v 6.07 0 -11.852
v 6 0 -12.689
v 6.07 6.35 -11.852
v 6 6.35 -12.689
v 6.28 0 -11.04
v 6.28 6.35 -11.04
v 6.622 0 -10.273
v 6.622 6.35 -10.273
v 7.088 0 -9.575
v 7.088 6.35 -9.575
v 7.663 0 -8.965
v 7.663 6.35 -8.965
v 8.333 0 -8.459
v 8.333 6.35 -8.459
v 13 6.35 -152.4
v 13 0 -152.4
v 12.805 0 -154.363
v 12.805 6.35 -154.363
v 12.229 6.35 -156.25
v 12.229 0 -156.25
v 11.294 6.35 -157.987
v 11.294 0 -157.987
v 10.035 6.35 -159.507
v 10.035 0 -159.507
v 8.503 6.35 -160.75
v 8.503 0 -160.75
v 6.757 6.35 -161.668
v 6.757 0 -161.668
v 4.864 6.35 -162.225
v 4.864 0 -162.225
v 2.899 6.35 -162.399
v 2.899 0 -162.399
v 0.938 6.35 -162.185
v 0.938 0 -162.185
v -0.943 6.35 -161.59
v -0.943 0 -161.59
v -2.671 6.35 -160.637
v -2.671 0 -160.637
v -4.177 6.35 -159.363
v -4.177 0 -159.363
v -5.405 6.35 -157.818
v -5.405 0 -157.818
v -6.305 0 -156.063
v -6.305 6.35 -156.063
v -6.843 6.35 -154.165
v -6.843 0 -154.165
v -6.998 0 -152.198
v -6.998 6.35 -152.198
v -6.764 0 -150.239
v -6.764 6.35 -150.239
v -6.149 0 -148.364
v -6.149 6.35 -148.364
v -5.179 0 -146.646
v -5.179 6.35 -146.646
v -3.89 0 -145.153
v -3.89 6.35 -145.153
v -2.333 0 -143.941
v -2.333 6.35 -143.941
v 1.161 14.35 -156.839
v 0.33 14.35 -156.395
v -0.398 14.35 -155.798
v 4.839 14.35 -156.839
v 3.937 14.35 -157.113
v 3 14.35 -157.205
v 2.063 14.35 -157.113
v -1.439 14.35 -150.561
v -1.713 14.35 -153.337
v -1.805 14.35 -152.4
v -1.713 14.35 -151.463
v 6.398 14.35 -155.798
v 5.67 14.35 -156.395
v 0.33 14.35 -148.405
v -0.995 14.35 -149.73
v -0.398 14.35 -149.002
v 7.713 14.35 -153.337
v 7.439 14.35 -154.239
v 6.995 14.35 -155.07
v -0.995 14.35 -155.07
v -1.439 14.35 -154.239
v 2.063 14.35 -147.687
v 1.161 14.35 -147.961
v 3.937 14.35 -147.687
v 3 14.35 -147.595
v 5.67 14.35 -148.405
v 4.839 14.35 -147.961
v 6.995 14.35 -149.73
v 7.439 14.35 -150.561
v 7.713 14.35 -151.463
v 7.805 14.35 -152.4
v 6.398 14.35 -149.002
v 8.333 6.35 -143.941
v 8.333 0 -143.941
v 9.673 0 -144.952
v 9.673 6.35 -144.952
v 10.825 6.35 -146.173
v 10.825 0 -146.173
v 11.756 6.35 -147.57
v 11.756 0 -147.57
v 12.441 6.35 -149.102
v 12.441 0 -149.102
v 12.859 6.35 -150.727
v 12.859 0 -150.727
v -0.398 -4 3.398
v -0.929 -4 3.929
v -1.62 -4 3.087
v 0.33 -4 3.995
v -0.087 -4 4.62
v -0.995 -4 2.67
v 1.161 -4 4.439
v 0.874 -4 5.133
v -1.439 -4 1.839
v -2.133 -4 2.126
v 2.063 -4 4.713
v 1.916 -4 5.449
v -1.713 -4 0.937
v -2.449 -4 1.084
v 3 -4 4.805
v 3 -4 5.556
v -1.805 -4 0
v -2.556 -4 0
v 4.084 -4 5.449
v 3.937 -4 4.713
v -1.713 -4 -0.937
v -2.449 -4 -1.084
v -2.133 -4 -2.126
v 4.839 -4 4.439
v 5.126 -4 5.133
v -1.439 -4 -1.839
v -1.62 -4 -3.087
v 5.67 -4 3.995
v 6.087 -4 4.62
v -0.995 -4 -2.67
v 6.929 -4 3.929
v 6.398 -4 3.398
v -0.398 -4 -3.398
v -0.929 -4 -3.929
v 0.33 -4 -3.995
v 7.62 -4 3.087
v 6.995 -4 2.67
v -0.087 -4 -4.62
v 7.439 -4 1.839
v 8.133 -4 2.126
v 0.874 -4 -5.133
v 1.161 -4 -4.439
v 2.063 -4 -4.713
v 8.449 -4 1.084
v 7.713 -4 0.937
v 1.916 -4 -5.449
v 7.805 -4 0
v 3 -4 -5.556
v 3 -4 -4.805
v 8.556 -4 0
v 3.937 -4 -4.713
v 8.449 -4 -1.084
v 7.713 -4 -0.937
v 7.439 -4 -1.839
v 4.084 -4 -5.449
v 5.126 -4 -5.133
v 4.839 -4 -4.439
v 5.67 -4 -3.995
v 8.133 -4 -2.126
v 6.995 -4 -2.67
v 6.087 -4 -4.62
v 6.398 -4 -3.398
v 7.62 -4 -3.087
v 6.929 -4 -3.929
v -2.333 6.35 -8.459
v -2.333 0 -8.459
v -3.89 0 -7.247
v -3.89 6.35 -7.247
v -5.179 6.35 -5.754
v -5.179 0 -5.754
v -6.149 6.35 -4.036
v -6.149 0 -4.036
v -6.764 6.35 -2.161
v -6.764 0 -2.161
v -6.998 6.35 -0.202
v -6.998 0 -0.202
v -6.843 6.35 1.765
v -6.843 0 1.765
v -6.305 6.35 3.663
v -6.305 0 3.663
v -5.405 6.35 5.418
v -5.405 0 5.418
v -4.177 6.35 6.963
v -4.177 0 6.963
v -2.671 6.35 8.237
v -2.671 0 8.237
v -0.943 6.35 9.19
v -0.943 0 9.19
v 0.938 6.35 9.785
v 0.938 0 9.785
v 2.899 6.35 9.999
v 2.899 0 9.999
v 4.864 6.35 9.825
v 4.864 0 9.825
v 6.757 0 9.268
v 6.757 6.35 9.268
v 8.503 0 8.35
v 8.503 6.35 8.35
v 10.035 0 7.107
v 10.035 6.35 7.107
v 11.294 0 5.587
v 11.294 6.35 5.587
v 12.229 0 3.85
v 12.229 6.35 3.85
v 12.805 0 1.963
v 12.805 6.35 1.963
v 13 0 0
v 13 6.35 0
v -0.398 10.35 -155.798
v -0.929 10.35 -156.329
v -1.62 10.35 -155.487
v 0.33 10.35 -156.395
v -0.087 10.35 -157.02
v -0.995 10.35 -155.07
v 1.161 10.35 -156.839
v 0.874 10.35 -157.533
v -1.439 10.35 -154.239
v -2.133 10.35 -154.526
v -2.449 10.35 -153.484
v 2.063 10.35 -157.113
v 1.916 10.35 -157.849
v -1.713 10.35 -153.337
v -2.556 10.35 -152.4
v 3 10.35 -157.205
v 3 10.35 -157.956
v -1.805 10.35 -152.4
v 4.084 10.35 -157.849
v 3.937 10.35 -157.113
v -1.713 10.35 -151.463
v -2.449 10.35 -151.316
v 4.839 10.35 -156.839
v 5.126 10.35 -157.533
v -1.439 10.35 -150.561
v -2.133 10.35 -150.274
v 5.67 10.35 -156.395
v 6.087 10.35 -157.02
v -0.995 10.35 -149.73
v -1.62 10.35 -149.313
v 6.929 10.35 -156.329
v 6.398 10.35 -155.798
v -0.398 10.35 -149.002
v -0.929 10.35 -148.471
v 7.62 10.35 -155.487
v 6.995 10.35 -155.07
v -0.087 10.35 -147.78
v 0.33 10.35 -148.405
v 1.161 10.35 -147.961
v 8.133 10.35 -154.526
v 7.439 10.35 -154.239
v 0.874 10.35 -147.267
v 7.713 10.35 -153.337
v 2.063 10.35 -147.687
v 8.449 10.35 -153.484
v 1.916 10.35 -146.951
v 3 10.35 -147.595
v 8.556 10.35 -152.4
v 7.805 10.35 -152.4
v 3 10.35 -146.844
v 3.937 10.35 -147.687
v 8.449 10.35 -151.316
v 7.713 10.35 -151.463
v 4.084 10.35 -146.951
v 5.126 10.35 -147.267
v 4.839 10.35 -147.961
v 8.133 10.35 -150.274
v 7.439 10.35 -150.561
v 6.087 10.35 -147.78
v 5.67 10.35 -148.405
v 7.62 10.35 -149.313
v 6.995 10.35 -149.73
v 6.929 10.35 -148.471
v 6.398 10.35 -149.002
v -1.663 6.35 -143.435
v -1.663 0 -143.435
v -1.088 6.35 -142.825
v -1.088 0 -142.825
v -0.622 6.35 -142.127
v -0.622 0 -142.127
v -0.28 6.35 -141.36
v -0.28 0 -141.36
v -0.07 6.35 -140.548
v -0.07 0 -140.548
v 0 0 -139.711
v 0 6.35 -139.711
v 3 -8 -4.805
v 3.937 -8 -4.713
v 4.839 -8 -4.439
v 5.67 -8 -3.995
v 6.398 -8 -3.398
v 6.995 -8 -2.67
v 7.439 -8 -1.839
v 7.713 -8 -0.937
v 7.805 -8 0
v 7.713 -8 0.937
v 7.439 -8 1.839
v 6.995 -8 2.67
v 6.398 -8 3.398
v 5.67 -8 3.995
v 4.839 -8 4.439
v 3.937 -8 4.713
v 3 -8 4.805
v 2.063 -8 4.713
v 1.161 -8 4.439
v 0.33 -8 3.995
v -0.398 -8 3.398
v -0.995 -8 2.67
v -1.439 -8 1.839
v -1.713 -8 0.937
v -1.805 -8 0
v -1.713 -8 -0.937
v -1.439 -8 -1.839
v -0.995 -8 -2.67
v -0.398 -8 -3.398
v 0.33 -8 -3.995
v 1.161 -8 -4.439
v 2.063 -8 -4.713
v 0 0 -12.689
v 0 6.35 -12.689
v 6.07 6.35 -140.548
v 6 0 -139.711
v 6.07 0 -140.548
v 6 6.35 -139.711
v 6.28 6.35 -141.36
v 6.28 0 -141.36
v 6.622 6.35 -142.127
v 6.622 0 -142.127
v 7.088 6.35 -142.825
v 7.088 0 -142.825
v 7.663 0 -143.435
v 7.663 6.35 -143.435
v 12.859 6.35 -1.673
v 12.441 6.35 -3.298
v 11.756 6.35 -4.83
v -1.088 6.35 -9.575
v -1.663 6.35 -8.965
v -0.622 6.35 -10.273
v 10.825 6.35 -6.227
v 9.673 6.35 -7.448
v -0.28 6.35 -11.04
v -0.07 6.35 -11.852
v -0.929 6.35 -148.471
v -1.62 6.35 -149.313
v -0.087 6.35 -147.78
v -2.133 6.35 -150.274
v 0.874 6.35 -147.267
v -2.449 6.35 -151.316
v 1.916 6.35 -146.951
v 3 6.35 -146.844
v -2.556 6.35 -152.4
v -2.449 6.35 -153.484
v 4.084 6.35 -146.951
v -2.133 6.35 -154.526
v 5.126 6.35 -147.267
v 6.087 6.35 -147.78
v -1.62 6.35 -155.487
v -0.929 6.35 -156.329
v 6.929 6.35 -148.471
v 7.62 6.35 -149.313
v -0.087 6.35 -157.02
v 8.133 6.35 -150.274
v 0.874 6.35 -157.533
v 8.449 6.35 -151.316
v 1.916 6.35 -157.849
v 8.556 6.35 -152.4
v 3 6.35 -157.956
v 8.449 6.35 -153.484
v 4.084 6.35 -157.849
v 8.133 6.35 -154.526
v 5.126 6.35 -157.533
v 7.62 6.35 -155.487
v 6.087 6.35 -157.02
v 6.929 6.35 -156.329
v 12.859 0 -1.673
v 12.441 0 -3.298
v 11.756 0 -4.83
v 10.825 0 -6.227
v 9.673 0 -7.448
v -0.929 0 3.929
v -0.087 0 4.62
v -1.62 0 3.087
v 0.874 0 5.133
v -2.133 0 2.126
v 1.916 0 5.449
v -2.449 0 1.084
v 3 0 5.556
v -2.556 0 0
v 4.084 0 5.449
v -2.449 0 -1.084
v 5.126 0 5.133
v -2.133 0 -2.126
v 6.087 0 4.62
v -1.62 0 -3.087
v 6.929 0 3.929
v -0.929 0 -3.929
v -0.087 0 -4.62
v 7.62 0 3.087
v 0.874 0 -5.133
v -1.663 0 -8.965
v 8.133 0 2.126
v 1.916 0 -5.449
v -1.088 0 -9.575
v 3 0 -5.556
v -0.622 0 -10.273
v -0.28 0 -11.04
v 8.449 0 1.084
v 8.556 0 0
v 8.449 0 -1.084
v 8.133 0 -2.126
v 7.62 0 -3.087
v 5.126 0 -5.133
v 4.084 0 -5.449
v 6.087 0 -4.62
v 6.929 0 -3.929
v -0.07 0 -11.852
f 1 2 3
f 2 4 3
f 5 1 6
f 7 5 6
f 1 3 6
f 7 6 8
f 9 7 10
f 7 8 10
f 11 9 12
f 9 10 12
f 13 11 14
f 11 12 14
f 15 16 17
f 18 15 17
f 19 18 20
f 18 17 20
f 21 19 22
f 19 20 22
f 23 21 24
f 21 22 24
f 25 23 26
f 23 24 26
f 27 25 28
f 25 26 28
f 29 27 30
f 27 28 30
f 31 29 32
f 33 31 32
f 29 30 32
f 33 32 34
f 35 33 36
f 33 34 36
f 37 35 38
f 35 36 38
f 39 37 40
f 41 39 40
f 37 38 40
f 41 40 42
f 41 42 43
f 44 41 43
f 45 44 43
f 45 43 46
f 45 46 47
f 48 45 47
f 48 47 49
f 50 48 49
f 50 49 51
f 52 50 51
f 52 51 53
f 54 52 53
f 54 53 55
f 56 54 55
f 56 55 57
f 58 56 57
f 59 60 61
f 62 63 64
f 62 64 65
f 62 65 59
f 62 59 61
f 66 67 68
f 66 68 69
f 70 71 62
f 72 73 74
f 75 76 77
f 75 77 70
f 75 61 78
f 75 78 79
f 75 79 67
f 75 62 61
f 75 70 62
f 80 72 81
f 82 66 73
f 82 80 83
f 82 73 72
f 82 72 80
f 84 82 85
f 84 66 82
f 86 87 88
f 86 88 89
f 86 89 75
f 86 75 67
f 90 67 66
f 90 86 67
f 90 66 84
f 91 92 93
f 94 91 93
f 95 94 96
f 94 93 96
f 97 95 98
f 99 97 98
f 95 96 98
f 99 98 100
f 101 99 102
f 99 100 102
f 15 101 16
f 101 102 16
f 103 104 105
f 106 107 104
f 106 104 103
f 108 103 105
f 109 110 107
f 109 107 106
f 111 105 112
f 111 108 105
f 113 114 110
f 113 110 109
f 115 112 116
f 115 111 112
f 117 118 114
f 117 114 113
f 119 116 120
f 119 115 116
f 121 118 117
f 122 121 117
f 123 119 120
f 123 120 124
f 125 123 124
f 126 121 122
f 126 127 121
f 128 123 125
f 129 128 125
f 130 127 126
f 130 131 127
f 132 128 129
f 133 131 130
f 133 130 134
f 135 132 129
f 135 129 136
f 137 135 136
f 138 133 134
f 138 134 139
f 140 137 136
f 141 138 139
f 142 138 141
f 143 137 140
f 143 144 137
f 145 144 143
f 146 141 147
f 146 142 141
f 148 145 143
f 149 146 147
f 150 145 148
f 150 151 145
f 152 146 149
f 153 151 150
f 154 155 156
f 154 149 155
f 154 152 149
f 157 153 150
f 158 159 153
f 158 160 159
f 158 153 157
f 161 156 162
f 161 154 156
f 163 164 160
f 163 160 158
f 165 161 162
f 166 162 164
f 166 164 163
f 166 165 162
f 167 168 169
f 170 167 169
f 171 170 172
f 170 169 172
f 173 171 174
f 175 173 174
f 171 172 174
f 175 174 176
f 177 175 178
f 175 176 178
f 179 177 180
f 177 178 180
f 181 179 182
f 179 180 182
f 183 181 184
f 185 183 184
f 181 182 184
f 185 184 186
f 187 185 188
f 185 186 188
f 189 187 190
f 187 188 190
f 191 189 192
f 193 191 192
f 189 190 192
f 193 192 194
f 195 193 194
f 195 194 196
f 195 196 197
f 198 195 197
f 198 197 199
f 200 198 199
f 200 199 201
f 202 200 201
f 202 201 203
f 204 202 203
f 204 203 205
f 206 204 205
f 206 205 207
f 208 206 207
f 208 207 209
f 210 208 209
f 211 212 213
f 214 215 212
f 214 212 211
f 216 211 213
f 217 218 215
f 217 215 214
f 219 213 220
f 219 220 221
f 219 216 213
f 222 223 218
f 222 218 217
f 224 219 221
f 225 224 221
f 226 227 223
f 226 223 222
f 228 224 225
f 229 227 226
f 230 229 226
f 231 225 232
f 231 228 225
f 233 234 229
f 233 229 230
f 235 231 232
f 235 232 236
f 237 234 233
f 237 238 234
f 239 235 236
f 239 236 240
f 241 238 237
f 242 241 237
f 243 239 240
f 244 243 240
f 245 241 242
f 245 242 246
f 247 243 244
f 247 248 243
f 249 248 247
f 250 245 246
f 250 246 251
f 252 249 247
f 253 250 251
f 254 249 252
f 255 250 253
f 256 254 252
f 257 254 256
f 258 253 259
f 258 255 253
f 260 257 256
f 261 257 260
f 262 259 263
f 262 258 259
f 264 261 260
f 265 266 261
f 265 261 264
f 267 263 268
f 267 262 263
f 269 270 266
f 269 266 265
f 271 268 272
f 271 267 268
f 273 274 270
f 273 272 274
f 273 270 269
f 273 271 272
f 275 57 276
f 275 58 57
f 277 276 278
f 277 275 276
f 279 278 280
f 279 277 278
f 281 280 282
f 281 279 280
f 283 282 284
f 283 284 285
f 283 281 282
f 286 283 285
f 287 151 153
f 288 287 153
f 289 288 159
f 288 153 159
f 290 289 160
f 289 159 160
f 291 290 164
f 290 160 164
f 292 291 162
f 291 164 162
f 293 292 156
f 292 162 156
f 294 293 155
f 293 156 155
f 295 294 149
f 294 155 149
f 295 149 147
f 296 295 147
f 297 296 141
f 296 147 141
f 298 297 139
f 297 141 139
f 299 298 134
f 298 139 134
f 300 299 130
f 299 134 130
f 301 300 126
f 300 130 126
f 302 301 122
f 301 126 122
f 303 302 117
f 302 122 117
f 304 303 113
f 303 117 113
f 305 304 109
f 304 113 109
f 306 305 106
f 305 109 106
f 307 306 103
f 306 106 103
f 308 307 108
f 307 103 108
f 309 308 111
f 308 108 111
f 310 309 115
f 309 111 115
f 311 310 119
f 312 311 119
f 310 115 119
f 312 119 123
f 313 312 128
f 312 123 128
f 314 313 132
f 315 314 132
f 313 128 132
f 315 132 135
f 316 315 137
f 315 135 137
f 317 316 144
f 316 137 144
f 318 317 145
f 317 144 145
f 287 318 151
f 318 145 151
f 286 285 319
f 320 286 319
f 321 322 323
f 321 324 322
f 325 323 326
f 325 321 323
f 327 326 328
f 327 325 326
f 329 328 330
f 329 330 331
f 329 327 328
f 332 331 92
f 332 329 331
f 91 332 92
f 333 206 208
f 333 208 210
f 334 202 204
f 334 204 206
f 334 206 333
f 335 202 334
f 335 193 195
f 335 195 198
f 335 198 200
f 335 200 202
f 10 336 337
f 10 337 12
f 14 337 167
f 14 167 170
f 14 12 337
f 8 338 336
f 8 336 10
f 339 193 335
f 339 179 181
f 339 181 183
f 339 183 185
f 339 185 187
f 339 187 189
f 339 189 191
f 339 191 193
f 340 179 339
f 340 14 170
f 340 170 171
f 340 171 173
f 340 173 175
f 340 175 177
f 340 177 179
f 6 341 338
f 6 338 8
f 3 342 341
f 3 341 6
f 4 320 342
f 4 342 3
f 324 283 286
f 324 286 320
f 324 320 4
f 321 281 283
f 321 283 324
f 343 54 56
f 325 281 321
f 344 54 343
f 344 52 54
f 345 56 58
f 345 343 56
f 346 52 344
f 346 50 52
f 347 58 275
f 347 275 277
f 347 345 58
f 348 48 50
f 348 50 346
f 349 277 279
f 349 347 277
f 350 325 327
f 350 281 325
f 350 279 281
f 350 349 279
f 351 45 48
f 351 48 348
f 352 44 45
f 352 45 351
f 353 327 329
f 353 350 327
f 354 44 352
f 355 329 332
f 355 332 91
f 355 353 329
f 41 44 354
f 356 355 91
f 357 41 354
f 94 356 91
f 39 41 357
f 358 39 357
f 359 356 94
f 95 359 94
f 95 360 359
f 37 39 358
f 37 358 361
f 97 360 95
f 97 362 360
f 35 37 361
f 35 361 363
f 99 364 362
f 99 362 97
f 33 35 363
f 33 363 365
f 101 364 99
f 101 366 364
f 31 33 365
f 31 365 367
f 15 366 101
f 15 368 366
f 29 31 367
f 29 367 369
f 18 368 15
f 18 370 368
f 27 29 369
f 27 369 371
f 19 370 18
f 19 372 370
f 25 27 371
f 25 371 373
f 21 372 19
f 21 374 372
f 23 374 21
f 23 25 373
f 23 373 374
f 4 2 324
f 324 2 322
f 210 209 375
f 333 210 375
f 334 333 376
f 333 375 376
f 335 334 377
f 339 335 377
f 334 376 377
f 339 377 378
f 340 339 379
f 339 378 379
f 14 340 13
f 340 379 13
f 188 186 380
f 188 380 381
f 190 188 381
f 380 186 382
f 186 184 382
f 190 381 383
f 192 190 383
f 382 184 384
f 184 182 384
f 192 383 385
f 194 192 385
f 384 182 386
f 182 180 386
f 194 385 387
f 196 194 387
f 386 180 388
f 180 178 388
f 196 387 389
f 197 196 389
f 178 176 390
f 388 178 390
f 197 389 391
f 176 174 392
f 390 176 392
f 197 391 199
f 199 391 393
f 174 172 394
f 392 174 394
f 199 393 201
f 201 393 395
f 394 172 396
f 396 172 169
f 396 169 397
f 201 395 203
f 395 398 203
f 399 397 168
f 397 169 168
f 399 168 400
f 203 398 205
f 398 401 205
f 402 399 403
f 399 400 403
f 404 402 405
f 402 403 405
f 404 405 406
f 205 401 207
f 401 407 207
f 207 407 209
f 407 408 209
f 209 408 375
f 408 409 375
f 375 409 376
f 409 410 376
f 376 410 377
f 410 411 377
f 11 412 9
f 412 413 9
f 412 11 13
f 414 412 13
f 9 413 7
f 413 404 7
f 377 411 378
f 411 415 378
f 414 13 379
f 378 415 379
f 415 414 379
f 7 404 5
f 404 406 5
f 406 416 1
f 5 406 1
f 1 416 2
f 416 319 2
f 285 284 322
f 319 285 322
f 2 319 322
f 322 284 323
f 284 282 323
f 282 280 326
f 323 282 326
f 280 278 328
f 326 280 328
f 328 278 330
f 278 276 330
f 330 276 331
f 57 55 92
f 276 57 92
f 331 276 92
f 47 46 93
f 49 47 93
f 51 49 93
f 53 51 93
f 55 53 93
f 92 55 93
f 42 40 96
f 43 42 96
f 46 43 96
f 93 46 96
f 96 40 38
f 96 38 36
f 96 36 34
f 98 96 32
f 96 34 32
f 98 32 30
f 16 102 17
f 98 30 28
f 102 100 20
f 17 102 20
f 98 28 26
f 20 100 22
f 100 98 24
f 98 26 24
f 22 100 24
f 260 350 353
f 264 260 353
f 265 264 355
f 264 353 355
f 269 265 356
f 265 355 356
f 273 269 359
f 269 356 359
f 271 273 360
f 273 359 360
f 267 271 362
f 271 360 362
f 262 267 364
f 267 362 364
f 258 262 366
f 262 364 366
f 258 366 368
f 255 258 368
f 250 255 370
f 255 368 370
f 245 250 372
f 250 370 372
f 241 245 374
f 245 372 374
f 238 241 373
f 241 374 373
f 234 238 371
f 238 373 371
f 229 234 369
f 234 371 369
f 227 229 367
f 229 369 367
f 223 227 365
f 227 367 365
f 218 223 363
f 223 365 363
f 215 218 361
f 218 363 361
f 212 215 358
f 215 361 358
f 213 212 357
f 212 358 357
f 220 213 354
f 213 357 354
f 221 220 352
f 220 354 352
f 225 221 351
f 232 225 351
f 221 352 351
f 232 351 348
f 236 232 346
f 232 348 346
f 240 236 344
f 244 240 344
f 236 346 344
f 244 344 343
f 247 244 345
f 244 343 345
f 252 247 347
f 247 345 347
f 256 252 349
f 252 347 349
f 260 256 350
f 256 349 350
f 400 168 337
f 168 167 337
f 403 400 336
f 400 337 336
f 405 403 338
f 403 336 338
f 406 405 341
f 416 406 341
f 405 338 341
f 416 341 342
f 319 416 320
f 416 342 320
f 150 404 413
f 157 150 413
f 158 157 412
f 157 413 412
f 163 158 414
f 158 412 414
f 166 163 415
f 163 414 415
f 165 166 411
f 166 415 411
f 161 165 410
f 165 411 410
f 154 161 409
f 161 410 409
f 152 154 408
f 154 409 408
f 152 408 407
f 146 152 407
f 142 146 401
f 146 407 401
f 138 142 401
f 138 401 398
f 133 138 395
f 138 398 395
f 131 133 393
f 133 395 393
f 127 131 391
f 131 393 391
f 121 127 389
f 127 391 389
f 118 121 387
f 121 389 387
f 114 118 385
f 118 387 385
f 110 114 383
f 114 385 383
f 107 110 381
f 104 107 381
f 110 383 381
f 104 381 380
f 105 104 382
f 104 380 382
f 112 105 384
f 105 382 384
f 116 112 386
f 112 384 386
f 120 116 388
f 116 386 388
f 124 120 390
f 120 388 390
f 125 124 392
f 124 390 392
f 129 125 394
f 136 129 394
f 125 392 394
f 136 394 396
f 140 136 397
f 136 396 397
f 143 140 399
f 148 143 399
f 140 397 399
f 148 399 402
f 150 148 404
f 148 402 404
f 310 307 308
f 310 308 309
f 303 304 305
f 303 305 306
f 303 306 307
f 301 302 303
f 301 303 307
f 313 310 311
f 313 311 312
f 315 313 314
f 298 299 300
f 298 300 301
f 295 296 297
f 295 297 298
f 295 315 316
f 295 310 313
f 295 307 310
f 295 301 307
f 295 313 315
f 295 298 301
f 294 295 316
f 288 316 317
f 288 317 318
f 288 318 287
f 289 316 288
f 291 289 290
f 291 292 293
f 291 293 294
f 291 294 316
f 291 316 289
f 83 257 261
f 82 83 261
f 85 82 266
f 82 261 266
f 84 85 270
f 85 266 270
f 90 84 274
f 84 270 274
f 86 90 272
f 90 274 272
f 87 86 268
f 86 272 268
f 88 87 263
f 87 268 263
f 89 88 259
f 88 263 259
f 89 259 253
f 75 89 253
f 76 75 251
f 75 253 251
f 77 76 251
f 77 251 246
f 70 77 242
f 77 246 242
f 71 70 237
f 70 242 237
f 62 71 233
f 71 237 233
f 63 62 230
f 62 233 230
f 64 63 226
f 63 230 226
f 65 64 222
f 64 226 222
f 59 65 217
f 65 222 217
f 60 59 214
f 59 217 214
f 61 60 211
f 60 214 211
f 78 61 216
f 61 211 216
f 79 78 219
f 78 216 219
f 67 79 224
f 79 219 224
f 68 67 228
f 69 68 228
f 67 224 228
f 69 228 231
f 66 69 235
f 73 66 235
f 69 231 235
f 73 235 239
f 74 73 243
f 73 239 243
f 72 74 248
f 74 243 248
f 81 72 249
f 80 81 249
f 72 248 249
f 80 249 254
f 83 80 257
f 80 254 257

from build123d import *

# Parameters (mm, degrees)
BOSS_EXTRUDE1_DEPTH = 6.35
SKETCH2_R           = 5.55625
BOSS_EXTRUDE2_DEPTH = 4
SKETCH4_R           = 4.805
BOSS_EXTRUDE3_DEPTH = 4
SKETCH5_R           = 5.55625
BOSS_EXTRUDE4_DEPTH = 4
SKETCH6_R           = 4.805
BOSS_EXTRUDE5_DEPTH = 4
FILLET1_R           = 5


with BuildPart() as part:
    # Sketch1 → Boss-Extrude1 (new body)
    with BuildSketch(Plane(origin=(0, 0, 0), x_dir=(1, 0, 0), z_dir=(0, 1, 0))):
        with BuildLine():
            Line((0, 9.539392014), (0, 0))
            Line((0, 0), (6, 0))
            Line((6, 0), (6, 9.539392014))
            ThreePointArc((6, 9.539392014), (3, 10), (0, 9.539392014))
        make_face()
        with BuildLine():
            Line((6, 0), (0, 0))
            Line((0, 0), (0, 9.539392014))
            ThreePointArc((0, 9.539392014), (-2.916079783, -8.062257748), (13, 0))
            ThreePointArc((13, 0), (11.062257748, 5.916079783), (6, 9.539392014))
            Line((6, 9.539392014), (6, 0))
        make_face()
        with BuildLine():
            Line((0, 142.860607986), (0, 9.539392014))
            ThreePointArc((0, 9.539392014), (3, 10), (6, 9.539392014))
            Line((6, 9.539392014), (6, 142.860607986))
            ThreePointArc((6, 142.860607986), (3, 142.4), (0, 142.860607986))
        make_face()
        with BuildLine():
            ThreePointArc((13, 152.4), (-2.916079783, 160.462257748), (0, 142.860607986))
            Line((0, 142.860607986), (0, 152.4))
            Line((0, 152.4), (6, 152.4))
            Line((6, 152.4), (6, 142.860607986))
            ThreePointArc((6, 142.860607986), (11.062257748, 146.483920217), (13, 152.4))
        make_face()
        with BuildLine():
            Line((0, 152.4), (0, 142.860607986))
            ThreePointArc((0, 142.860607986), (3, 142.4), (6, 142.860607986))
            Line((6, 142.860607986), (6, 152.4))
            Line((6, 152.4), (0, 152.4))
        make_face()
    extrude(amount=BOSS_EXTRUDE1_DEPTH)

    # Sketch2 → Boss-Extrude2 (add)
    with BuildSketch(Plane(origin=(0, 6.35, 0), x_dir=(1, 0, 0), z_dir=(0, 1, 0))):
        with Locations(Location((3, 152.4, 0), (0, 0, 270))):
            Circle(SKETCH2_R)
    extrude(amount=BOSS_EXTRUDE2_DEPTH)

    # Sketch4 → Boss-Extrude3 (add)
    with BuildSketch(Plane(origin=(0, 10.35, 0), x_dir=(1, 0, 0), z_dir=(0, 1, 0))):
        with Locations(Location((3, 152.4, 0), (0, 0, 270))):
            Circle(SKETCH4_R)
    extrude(amount=BOSS_EXTRUDE3_DEPTH)

    # Sketch5 → Boss-Extrude4 (add)
    with BuildSketch(Plane.XZ):
        with Locations(Location((3, 0, 0), (0, 0, 270))):
            Circle(SKETCH5_R)
    extrude(amount=BOSS_EXTRUDE4_DEPTH)

    # Sketch6 → Boss-Extrude5 (add)
    with BuildSketch(Plane.XZ.offset(4)):
        with Locations(Location((3, 0, 0), (0, 0, 270))):
            Circle(SKETCH6_R)
    extrude(amount=BOSS_EXTRUDE5_DEPTH)

    # Fillet1
    fillet1_edges = [part.edges().sort_by_distance(p)[0] for p in [
        (0, 3.175, -9.539392014),
        (0, 3.175, -142.860607986),
        (6, 3.175, -142.860607986),
        (6, 3.175, -9.539392014),
    ]]
    fillet(fillet1_edges, radius=FILLET1_R)


solid = part.part
